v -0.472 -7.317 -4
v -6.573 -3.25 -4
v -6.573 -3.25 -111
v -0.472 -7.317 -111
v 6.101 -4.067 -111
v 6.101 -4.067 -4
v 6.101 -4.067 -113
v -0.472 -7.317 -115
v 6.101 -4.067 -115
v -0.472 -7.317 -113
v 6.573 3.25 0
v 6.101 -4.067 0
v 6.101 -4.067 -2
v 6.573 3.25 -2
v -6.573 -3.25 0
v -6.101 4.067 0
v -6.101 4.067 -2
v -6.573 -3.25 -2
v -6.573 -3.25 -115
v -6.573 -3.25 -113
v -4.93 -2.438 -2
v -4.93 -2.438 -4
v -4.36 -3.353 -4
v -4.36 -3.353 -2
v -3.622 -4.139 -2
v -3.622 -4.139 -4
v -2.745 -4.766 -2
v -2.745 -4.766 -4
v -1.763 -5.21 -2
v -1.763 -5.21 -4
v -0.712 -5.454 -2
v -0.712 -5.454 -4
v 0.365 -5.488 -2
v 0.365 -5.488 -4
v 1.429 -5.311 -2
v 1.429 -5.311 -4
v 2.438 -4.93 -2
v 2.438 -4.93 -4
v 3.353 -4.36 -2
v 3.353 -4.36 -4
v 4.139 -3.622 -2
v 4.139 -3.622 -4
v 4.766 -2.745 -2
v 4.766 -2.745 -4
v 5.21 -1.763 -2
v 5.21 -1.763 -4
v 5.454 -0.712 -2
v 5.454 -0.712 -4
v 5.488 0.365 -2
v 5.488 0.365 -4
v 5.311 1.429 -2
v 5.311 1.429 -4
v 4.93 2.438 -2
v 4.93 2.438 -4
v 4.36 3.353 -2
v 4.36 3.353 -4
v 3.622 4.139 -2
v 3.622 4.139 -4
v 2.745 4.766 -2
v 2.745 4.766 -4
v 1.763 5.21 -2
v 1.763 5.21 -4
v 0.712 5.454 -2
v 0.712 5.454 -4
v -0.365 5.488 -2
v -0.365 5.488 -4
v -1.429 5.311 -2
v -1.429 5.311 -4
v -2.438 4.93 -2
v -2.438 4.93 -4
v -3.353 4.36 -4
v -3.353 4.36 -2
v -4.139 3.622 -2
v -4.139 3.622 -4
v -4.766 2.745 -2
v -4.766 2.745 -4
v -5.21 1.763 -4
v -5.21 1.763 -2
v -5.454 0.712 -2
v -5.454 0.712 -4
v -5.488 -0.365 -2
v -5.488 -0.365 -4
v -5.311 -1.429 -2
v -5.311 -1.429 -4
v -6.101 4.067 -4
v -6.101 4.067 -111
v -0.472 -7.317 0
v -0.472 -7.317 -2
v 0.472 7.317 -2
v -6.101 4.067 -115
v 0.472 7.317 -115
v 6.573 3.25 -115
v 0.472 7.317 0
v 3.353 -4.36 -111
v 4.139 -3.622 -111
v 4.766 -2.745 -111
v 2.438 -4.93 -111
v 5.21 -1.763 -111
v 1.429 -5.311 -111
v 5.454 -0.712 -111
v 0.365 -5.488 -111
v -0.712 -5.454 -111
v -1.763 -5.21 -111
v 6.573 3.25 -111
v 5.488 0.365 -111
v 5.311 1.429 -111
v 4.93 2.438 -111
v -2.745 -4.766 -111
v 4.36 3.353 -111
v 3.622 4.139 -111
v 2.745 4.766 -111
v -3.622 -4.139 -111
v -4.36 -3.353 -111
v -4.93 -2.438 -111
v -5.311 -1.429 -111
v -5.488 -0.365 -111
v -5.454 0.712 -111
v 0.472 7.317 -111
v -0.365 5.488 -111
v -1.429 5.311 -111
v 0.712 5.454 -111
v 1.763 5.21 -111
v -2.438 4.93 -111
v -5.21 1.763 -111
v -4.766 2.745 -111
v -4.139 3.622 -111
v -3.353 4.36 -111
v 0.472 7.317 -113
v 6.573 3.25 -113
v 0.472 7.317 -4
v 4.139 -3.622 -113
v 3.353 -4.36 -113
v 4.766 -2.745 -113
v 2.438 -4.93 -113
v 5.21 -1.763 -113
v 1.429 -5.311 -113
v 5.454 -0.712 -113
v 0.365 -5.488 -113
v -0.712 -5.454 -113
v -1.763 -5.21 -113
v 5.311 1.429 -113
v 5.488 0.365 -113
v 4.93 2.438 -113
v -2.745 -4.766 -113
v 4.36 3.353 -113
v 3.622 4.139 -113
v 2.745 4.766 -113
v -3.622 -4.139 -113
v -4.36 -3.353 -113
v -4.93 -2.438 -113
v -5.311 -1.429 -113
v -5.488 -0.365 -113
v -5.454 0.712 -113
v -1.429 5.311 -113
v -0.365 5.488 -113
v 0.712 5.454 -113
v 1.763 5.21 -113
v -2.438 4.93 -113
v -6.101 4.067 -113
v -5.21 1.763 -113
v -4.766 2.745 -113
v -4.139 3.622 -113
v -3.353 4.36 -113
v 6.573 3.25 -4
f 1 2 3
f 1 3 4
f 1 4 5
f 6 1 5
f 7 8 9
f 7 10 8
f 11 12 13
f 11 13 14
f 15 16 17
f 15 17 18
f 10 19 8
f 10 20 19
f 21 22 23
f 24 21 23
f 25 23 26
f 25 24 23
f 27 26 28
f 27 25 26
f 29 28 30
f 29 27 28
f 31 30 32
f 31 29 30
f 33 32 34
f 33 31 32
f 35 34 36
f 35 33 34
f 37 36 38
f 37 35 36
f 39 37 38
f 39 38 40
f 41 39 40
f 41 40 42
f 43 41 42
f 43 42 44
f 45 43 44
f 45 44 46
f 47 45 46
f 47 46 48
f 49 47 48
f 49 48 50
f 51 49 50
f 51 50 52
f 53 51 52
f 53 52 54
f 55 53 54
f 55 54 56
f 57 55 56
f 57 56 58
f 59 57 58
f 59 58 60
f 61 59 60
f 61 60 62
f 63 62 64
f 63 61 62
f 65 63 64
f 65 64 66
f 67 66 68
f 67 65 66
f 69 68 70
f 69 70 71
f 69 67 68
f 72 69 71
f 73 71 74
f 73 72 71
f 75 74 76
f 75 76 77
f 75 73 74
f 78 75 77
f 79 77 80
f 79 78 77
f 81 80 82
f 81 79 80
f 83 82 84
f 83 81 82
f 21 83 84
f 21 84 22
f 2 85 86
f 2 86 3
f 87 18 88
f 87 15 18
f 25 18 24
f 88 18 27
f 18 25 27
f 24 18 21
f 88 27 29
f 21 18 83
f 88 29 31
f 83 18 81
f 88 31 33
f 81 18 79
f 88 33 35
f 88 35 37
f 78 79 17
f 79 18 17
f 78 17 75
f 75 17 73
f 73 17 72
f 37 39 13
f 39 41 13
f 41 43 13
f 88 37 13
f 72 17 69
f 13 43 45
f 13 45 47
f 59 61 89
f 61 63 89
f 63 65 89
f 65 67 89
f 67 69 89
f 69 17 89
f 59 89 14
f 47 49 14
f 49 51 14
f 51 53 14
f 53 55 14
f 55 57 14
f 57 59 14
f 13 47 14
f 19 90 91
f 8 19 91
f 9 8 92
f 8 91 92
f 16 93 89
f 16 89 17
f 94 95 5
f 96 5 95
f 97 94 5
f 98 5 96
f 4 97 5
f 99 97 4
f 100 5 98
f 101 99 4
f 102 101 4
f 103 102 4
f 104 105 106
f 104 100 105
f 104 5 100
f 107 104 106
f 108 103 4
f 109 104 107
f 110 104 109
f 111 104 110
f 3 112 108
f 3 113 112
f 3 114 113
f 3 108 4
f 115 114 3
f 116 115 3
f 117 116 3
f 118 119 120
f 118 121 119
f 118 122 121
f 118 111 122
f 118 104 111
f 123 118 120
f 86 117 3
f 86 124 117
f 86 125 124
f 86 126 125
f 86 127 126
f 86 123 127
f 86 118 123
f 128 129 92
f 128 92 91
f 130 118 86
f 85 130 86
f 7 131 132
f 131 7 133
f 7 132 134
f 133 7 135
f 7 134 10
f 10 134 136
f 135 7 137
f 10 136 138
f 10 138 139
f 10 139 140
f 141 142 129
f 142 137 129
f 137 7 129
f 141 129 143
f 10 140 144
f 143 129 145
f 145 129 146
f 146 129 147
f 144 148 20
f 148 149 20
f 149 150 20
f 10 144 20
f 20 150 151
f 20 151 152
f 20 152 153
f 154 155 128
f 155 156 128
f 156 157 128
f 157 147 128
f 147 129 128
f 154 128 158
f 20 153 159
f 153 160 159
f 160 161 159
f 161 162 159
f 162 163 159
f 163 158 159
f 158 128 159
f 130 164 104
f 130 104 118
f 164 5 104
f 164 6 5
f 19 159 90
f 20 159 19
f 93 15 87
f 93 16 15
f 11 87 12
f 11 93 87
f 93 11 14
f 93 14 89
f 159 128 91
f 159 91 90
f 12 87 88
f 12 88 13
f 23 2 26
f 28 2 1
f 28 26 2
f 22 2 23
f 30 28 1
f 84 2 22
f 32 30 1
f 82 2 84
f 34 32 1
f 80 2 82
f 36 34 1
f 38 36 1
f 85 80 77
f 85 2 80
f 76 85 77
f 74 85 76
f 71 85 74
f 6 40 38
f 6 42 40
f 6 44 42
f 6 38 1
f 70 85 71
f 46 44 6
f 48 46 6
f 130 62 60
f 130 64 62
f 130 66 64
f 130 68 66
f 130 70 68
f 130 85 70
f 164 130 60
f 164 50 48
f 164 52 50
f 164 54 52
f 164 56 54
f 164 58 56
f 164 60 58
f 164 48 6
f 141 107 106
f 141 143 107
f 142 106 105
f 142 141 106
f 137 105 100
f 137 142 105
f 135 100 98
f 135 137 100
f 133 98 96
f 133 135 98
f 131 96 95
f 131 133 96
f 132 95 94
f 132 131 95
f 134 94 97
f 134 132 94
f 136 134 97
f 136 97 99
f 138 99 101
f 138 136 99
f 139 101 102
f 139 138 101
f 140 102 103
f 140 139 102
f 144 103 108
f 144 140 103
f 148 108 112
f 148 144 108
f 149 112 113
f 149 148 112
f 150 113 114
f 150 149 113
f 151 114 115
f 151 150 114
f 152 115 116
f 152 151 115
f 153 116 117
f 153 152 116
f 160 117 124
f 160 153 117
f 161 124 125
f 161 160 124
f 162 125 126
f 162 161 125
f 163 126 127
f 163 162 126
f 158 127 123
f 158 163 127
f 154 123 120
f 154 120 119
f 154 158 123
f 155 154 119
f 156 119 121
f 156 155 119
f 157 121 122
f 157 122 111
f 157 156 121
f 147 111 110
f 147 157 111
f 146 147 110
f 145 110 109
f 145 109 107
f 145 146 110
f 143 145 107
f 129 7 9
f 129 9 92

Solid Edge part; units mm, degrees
sketch "Sketch1" plane through (0, 0, 0) normal (0, 0, 1) x (1, 0, 0)
  line L0 (-6.1009, 4.0673) -> (-6.5728, -3.2499)
  line L1 (-6.5728, -3.2499) -> (-0.4719, -7.3171)
  line L2 (-0.4719, -7.3171) -> (6.1009, -4.0673)
  line L3 (6.1009, -4.0673) -> (6.5728, 3.2499)
  line L4 (6.5728, 3.2499) -> (0.4719, 7.3171)
  line L5 (0.4719, 7.3171) -> (-6.1009, 4.0673)
extrude "Protrusion1" add sketch "Sketch1" against normal blind 115
sketch "Sketch2" plane through (0, 0, -2) normal (0, 0, 1) x (-0.8964, -0.4432, 0)
  circle A0 centre (0, 0) radius 5.5
  circle A1 centre (0, 0) radius 13.1424
extrude "ExtrudedCutout_1" cut sketch "Sketch2" against normal blind 2
sketch "Sketch3" plane through (0, 0, -113) normal (0, 0, -1) x (0.8964, 0.4432, 0)
  circle A0 centre (0, 0) radius 5.5
  circle A1 centre (0, 0) radius 13.1424
extrude "ExtrudedCutout_2" cut sketch "Sketch3" against normal blind 2
properties part number "BumbleB0649"
